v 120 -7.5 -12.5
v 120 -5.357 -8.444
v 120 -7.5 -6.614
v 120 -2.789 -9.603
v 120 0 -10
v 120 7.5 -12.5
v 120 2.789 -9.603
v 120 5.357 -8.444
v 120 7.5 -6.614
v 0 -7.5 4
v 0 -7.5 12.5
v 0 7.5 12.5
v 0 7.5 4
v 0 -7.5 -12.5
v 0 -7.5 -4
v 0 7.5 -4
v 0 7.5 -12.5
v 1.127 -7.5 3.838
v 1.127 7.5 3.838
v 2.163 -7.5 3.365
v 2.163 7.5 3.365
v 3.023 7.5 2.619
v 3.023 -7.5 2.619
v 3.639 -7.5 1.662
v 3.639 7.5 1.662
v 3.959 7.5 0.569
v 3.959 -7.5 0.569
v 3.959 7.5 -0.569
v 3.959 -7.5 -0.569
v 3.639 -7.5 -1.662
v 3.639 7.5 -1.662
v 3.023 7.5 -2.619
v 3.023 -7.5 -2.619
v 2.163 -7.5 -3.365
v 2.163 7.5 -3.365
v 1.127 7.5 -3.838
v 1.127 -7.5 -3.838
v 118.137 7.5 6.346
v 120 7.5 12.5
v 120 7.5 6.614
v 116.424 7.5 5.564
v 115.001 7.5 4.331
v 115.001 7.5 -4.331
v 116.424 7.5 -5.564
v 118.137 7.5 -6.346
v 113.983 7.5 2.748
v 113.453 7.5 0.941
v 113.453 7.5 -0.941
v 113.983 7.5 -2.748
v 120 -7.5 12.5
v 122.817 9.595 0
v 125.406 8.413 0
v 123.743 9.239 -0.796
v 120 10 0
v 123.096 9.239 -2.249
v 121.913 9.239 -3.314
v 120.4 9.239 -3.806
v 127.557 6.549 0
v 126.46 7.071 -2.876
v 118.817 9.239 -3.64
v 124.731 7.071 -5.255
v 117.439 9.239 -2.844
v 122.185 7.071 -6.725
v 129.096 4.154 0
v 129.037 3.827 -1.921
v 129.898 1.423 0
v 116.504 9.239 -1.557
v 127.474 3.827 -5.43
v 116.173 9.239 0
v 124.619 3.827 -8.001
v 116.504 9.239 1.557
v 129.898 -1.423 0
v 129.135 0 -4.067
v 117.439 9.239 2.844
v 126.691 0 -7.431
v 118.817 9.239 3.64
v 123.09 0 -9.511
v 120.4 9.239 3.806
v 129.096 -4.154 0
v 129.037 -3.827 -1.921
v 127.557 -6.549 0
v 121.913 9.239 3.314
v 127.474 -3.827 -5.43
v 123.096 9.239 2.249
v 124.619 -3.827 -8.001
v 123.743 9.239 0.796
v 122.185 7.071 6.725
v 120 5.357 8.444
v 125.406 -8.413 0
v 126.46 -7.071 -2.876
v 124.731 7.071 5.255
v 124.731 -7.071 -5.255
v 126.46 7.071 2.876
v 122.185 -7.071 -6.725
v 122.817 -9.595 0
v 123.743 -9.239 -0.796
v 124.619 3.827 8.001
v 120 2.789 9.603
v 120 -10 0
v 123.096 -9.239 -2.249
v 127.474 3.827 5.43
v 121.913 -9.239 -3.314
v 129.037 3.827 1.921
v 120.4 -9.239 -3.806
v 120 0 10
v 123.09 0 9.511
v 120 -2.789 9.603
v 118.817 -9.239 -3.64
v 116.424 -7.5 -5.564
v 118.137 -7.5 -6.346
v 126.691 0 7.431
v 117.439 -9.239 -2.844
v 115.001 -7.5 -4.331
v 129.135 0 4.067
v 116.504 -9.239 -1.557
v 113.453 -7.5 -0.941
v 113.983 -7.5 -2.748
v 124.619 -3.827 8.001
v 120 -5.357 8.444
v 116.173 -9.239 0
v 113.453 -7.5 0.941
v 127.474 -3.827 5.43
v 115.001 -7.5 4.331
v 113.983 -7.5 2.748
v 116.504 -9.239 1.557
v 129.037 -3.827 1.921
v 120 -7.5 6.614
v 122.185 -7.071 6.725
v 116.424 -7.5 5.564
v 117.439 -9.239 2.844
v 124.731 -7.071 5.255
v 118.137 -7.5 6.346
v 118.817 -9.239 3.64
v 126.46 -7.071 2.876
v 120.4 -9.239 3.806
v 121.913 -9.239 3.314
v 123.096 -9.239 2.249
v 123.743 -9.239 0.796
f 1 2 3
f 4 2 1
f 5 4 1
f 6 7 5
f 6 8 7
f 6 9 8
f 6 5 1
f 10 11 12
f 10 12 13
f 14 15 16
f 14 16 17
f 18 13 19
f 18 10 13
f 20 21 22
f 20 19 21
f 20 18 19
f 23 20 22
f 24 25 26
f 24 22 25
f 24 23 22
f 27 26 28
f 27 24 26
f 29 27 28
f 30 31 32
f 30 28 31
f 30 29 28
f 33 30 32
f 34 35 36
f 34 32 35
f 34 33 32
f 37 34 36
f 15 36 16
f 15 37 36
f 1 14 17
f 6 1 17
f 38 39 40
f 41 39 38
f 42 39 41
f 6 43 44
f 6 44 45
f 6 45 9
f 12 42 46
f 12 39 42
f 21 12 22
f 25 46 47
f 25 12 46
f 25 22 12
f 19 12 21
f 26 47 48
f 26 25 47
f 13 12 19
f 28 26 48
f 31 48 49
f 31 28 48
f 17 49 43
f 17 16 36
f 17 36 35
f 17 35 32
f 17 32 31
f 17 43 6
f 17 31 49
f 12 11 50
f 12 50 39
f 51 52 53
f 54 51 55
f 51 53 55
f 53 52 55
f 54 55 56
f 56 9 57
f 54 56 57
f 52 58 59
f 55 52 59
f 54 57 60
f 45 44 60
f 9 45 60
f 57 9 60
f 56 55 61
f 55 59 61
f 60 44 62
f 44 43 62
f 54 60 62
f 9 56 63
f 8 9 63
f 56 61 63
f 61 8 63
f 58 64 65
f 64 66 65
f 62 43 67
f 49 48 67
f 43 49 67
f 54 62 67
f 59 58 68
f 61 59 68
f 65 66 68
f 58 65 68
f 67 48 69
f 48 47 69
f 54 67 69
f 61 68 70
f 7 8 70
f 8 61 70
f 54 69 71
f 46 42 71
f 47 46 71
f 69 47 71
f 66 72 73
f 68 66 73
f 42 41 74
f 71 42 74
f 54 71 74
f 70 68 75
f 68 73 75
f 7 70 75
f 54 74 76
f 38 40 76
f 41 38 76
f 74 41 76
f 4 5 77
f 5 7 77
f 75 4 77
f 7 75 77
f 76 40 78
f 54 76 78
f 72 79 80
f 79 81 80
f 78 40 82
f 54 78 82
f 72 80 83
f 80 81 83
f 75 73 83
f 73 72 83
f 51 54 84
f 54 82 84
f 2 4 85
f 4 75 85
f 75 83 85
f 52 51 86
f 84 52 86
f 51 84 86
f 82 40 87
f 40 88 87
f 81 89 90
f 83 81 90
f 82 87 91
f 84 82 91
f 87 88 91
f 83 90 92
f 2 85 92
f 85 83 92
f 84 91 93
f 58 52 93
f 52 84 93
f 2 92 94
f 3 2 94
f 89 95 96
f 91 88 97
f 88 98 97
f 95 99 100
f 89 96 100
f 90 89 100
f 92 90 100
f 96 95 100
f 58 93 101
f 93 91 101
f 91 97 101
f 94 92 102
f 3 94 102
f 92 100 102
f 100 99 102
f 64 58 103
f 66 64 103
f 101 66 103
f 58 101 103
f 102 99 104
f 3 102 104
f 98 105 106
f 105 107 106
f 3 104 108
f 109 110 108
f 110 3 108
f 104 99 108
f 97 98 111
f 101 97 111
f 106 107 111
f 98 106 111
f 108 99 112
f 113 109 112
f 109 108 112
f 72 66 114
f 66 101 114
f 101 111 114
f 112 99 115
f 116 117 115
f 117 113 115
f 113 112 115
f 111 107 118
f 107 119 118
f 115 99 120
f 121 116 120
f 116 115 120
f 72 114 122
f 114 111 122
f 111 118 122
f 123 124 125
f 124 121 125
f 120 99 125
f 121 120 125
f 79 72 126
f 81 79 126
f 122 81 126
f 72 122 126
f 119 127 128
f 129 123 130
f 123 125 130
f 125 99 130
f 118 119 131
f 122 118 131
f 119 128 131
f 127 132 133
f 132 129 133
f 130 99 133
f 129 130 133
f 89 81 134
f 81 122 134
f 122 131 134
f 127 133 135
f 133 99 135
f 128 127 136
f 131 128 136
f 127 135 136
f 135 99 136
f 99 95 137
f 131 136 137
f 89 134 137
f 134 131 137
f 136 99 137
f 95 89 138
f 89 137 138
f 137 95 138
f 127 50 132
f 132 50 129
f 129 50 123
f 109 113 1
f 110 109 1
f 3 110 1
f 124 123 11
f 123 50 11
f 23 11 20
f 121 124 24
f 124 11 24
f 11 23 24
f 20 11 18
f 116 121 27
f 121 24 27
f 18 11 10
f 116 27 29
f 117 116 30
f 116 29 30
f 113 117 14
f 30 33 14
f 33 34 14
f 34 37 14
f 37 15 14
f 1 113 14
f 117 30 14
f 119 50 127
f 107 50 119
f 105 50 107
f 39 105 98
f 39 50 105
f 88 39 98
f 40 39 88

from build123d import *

# Parameters (mm, degrees)
SKETCH2_W           = 25
SKETCH2_H           = 15
BOSS_EXTRUDE1_DEPTH = 120
SKETCH3_R           = 4
CUT_EXTRUDE1_DEPTH  = 25


with BuildPart() as part:
    # Sketch2 → Boss-Extrude1 (new body)
    with BuildSketch(Plane(origin=(0, 0, 0), x_dir=(0, 0, -1), z_dir=(1, 0, 0))):
        Rectangle(SKETCH2_W, SKETCH2_H)
    extrude(amount=BOSS_EXTRUDE1_DEPTH)

    # Sketch3 → Cut-Extrude1 (cut)
    with BuildSketch(Plane(origin=(0, -12.5, 0), x_dir=(1, 0, 0), z_dir=(0, 1, 0))):
        Circle(SKETCH3_R)
    extrude(amount=CUT_EXTRUDE1_DEPTH, mode=Mode.SUBTRACT)

    # Sketch4 → Revolve1 (revolve)
    with BuildSketch(Plane.XY):
        with BuildLine():
            Line((120, -10), (120, 10))
            ThreePointArc((120, 10), (130, 0), (120, -10))
        make_face()
    revolve(axis=Axis((120, -10, 0), (0, 1, 0)))


solid = part.part
